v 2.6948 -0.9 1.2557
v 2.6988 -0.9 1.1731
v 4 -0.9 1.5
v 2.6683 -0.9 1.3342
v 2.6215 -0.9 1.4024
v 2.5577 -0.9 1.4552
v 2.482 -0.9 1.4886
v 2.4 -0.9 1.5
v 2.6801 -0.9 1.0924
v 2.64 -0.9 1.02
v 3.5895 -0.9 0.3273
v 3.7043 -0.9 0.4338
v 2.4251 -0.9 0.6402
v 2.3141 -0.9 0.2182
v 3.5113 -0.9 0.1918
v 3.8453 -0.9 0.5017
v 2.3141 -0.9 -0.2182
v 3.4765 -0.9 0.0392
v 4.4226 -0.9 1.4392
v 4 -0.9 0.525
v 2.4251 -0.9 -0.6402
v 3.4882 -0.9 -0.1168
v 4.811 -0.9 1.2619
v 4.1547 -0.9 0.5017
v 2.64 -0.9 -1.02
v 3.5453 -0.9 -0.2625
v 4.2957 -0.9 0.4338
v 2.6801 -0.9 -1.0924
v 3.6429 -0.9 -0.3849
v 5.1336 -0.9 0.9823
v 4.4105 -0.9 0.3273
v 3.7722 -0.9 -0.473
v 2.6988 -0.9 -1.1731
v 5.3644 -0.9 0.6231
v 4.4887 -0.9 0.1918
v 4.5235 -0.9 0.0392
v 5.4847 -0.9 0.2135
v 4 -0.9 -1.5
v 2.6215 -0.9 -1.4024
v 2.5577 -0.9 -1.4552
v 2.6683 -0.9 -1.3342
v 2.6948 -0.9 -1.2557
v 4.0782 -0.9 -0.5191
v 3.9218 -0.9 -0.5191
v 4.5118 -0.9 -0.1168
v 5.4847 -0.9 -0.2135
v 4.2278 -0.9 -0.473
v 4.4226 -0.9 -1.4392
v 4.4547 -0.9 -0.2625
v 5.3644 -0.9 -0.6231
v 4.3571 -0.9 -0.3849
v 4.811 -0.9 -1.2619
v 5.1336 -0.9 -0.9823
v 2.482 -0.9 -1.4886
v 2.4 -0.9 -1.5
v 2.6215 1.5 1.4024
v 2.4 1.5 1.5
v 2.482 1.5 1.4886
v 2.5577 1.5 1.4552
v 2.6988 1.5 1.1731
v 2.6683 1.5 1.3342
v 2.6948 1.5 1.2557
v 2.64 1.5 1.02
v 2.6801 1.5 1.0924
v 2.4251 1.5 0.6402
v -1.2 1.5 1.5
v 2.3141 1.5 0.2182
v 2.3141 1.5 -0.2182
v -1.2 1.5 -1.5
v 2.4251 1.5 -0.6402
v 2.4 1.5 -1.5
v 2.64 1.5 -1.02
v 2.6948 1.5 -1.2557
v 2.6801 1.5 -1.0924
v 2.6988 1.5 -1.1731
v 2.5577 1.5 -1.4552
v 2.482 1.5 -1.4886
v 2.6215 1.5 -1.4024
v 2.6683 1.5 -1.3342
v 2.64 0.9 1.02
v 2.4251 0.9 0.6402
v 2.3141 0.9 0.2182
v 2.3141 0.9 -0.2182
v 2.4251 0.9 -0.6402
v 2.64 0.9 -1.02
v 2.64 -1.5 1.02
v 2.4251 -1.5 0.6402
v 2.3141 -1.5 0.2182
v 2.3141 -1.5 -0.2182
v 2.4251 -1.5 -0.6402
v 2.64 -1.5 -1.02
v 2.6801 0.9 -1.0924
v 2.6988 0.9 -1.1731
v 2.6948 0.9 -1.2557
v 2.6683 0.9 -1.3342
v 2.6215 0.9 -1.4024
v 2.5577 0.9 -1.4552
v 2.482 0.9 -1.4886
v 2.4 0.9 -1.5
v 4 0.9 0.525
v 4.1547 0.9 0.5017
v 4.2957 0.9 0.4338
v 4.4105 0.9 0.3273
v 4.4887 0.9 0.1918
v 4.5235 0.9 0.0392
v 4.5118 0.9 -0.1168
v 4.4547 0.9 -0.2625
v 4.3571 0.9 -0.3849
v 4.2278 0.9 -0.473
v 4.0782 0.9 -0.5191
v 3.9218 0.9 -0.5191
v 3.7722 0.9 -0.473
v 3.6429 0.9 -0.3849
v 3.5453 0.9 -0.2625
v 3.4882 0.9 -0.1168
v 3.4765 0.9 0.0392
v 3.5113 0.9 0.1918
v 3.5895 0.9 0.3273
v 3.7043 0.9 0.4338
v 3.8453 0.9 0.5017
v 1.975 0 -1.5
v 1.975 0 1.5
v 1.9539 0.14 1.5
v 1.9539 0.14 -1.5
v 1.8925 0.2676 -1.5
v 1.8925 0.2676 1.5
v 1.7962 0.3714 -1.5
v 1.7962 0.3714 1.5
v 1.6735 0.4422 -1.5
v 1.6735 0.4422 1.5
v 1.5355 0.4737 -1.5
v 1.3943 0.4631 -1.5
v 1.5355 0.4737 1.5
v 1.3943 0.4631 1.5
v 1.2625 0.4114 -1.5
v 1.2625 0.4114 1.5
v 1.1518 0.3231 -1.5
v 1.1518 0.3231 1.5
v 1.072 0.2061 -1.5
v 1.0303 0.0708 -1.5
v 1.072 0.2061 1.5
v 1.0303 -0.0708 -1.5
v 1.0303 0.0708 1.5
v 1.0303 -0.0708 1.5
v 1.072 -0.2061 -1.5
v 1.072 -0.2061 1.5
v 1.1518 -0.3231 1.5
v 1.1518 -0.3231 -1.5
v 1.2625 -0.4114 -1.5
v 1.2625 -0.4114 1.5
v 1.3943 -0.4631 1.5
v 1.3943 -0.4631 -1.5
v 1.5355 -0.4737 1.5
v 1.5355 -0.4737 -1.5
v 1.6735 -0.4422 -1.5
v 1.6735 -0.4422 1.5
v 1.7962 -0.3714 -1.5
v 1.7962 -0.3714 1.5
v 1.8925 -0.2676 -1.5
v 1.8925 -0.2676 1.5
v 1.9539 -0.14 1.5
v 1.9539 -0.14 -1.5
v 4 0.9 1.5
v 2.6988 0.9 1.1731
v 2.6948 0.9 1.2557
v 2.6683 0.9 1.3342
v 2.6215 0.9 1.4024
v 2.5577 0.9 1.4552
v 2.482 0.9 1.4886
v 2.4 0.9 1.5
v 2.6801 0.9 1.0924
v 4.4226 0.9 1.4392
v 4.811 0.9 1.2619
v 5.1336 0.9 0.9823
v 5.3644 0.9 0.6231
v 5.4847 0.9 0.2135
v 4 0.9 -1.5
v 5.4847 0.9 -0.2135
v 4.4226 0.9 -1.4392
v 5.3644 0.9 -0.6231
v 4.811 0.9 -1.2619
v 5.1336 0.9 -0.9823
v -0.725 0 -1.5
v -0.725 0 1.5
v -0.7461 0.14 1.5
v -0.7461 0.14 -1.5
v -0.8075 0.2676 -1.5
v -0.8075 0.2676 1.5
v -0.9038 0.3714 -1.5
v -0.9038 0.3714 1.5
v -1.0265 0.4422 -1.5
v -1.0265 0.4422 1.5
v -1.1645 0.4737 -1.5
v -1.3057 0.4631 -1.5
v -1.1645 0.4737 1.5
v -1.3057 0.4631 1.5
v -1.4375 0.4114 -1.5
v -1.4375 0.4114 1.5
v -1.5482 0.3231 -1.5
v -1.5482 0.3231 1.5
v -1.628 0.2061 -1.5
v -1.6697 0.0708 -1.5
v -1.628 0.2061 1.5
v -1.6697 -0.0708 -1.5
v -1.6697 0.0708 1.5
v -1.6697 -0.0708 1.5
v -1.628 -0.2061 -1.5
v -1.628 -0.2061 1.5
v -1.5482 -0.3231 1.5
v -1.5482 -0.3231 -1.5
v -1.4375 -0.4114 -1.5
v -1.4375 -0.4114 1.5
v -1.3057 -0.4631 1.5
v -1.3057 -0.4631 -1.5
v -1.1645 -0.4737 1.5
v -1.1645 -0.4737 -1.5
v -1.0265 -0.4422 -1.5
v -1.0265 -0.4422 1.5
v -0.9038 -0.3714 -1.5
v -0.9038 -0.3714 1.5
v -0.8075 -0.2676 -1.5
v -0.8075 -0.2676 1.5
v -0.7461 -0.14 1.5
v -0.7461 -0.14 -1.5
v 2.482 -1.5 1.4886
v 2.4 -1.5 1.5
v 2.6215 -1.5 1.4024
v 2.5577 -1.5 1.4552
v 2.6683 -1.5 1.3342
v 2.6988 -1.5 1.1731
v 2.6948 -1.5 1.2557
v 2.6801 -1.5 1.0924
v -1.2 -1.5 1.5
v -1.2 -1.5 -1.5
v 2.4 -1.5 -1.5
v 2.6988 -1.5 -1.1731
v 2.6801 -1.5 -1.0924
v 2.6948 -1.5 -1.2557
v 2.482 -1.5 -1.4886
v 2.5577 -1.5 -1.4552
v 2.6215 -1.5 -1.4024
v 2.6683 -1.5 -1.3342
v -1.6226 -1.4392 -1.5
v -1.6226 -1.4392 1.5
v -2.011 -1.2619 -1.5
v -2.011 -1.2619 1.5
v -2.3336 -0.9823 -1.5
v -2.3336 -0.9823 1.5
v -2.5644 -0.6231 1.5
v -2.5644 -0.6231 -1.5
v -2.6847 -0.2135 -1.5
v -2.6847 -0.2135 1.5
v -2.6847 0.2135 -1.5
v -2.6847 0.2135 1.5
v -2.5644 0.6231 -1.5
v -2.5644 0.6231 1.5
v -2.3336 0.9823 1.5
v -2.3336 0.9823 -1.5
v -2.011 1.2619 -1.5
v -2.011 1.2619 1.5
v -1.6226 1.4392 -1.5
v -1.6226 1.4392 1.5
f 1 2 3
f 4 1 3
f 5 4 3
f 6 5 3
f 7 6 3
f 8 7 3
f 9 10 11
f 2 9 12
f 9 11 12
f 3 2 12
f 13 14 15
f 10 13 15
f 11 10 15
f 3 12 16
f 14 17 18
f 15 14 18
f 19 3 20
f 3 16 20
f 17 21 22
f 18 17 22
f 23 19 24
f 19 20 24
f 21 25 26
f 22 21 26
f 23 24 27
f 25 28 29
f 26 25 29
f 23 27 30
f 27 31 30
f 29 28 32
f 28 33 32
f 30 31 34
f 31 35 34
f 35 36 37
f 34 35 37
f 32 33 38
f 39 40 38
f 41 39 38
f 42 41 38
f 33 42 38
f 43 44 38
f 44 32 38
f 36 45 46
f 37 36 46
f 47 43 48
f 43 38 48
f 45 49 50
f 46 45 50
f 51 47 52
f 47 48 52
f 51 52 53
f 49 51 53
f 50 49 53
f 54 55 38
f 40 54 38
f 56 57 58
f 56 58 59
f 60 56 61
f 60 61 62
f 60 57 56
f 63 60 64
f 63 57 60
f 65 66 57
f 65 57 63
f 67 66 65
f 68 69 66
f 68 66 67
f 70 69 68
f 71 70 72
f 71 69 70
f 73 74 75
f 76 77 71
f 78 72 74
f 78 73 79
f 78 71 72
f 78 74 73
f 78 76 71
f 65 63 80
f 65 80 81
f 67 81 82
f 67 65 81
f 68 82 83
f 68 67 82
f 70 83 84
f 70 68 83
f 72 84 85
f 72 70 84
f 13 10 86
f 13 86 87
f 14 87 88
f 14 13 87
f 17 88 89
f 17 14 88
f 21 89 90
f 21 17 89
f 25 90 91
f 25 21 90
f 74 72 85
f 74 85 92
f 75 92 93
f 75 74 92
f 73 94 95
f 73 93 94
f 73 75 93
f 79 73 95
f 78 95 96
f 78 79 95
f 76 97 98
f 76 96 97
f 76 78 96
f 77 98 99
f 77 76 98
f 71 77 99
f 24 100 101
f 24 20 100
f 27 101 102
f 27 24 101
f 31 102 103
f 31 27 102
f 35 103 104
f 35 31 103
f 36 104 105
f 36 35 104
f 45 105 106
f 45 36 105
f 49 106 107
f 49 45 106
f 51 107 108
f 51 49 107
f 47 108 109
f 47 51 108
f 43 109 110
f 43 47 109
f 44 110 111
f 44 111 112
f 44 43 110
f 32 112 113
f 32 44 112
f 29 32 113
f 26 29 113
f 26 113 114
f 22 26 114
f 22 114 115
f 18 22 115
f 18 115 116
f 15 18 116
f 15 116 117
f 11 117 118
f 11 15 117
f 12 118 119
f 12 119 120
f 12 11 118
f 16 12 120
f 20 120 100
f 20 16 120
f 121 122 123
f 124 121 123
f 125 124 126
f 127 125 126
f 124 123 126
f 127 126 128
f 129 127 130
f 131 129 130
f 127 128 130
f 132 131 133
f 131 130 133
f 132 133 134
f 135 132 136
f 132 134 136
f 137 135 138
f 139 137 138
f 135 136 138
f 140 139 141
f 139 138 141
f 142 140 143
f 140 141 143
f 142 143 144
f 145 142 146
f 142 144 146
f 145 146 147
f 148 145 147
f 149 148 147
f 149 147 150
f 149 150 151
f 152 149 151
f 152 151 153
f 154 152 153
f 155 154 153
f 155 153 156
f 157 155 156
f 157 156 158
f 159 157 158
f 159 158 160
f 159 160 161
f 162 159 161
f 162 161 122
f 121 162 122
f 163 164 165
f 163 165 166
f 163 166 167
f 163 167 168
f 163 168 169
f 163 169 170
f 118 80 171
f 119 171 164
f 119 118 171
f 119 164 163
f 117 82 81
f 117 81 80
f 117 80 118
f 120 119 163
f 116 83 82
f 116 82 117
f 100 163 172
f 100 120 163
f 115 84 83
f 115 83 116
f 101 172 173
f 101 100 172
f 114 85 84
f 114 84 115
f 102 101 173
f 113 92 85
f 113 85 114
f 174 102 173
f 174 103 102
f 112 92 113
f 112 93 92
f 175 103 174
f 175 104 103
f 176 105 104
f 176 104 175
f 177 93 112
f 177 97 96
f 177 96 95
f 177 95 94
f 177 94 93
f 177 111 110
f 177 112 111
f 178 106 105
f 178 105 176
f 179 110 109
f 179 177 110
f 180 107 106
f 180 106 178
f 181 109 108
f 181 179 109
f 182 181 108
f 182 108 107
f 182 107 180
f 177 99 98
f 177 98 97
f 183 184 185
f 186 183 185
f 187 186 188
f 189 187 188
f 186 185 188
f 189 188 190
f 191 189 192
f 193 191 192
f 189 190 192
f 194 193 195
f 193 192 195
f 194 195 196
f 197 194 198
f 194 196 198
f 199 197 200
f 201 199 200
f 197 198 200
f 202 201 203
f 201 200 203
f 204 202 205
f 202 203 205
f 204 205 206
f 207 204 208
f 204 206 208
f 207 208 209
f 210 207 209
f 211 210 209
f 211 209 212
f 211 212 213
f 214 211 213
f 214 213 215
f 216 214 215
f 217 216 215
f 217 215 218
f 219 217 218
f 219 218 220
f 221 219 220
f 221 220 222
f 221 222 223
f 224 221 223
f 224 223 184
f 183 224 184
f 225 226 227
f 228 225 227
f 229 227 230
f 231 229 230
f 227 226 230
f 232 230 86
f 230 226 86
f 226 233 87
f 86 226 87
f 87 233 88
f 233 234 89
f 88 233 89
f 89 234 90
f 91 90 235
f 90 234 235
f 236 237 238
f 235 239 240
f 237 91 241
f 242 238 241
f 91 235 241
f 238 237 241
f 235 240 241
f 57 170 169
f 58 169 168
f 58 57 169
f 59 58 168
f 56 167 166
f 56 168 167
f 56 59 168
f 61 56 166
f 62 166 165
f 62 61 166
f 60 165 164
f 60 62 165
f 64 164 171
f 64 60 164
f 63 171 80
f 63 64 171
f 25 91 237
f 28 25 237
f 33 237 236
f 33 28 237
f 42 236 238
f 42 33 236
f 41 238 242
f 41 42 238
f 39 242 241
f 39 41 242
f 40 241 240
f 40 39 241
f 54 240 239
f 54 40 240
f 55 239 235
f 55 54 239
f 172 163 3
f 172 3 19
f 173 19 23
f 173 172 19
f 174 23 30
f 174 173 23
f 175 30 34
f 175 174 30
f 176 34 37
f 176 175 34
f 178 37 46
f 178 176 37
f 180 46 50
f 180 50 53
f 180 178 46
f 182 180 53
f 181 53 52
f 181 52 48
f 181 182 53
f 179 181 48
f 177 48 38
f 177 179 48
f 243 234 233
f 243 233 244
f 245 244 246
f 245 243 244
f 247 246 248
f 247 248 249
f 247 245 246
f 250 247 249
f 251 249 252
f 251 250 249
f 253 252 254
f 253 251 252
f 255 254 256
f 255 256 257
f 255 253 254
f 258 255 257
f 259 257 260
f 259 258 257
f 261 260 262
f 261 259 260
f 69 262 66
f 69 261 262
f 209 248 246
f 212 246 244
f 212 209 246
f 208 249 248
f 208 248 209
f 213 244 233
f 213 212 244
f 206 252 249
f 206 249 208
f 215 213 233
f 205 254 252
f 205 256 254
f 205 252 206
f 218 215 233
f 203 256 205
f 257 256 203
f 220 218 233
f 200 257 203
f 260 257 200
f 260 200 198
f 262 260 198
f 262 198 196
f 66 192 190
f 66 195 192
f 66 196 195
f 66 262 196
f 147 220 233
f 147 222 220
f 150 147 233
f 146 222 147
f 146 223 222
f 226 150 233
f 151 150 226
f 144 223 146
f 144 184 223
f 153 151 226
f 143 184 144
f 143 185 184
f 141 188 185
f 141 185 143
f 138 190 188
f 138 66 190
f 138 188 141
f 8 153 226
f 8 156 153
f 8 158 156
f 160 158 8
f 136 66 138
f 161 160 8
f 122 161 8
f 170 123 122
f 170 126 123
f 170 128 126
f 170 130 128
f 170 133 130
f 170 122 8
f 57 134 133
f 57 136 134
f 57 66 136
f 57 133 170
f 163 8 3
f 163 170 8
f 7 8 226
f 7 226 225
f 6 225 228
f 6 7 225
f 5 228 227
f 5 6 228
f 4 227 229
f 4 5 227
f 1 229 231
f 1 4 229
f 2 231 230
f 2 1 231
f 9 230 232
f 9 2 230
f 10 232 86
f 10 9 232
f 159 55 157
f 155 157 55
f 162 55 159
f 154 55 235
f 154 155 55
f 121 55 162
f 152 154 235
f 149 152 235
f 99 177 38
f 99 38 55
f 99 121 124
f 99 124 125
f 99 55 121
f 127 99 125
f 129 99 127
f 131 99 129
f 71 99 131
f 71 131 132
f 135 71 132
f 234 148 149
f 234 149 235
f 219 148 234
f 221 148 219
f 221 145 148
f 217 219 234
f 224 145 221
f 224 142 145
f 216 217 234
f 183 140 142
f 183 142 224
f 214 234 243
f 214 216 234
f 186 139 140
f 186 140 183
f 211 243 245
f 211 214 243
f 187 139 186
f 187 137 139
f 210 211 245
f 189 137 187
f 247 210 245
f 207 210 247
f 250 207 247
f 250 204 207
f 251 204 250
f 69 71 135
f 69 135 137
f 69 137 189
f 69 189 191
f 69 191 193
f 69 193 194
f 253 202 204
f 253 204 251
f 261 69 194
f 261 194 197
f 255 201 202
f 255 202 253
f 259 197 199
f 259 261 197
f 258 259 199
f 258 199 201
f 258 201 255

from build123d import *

# Parameters (mm, degrees)
SKETCH1_R                = 0.525
BOSS_EXTRUDE1_DEPTH      = 0.9
BOSS_EXTRUDE2_DEPTH      = 1.5
M1_2X0_25_TAPPED_HOLE1_D = 0.95
CUT_EXTRUDE1_DEPTH       = 7.442049363


with BuildPart() as part:
    # Sketch1 → Boss-Extrude1 (new, symmetric)
    with BuildSketch(Plane(origin=(0, 0, 0), x_dir=(1, 0, 0), z_dir=(0, 1, 0))):
        with BuildLine():
            ThreePointArc((2.64, -1.02), (2.668328157, -1.334164079), (2.4, -1.5))
            Line((2.4, -1.5), (4, -1.5))
            ThreePointArc((4, -1.5), (5.5, 0), (4, 1.5))
            Line((4, 1.5), (2.4, 1.5))
            ThreePointArc((2.4, 1.5), (2.668328157, 1.334164079), (2.64, 1.02))
            ThreePointArc((2.64, 1.02), (2.3, 0), (2.64, -1.02))
        make_face()
        with Locations((4, 0)):
            Circle(SKETCH1_R, mode=Mode.SUBTRACT)
    extrude(amount=BOSS_EXTRUDE1_DEPTH, both=True)

    # Sketch1<4> → Boss-Extrude2 (add, symmetric)
    with BuildSketch(Plane(origin=(0, 0, 0), x_dir=(1, 0, 0), z_dir=(0, 1, 0))):
        with BuildLine():
            Line((-4, 1.5), (-4, -1.5))
            Line((-4, -1.5), (2.4, -1.5))
            ThreePointArc((2.4, -1.5), (2.668328157, -1.334164079), (2.64, -1.02))
            ThreePointArc((2.64, -1.02), (2.3, 0), (2.64, 1.02))
            ThreePointArc((2.64, 1.02), (2.668328157, 1.334164079), (2.4, 1.5))
            Line((2.4, 1.5), (-4, 1.5))
        make_face()
    extrude(amount=BOSS_EXTRUDE2_DEPTH, both=True)

    # M1.2x0.25 Tapped Hole1 (through all)
    with Locations(Plane(origin=(0, 0, -1.5), x_dir=(-1, 0, 0), z_dir=(0, 0, -1))):
        with Locations((-1.5, 0), (1.2, 0)):
            Hole(M1_2X0_25_TAPPED_HOLE1_D / 2)

    # Sketch5 → Cut-Extrude1 (cut, through all)
    with BuildSketch(Plane(origin=(0, 0, -1.5), x_dir=(-1, 0, 0), z_dir=(0, 0, -1))):
        with BuildLine():
            Line((1.2, 1.5), (4, 1.5))
            Line((4, 1.5), (4, -1.5))
            Line((4, -1.5), (1.2, -1.5))
            ThreePointArc((1.2, -1.5), (2.7, 0), (1.2, 1.5))
        make_face()
    extrude(amount=-CUT_EXTRUDE1_DEPTH, mode=Mode.SUBTRACT)


solid = part.part
